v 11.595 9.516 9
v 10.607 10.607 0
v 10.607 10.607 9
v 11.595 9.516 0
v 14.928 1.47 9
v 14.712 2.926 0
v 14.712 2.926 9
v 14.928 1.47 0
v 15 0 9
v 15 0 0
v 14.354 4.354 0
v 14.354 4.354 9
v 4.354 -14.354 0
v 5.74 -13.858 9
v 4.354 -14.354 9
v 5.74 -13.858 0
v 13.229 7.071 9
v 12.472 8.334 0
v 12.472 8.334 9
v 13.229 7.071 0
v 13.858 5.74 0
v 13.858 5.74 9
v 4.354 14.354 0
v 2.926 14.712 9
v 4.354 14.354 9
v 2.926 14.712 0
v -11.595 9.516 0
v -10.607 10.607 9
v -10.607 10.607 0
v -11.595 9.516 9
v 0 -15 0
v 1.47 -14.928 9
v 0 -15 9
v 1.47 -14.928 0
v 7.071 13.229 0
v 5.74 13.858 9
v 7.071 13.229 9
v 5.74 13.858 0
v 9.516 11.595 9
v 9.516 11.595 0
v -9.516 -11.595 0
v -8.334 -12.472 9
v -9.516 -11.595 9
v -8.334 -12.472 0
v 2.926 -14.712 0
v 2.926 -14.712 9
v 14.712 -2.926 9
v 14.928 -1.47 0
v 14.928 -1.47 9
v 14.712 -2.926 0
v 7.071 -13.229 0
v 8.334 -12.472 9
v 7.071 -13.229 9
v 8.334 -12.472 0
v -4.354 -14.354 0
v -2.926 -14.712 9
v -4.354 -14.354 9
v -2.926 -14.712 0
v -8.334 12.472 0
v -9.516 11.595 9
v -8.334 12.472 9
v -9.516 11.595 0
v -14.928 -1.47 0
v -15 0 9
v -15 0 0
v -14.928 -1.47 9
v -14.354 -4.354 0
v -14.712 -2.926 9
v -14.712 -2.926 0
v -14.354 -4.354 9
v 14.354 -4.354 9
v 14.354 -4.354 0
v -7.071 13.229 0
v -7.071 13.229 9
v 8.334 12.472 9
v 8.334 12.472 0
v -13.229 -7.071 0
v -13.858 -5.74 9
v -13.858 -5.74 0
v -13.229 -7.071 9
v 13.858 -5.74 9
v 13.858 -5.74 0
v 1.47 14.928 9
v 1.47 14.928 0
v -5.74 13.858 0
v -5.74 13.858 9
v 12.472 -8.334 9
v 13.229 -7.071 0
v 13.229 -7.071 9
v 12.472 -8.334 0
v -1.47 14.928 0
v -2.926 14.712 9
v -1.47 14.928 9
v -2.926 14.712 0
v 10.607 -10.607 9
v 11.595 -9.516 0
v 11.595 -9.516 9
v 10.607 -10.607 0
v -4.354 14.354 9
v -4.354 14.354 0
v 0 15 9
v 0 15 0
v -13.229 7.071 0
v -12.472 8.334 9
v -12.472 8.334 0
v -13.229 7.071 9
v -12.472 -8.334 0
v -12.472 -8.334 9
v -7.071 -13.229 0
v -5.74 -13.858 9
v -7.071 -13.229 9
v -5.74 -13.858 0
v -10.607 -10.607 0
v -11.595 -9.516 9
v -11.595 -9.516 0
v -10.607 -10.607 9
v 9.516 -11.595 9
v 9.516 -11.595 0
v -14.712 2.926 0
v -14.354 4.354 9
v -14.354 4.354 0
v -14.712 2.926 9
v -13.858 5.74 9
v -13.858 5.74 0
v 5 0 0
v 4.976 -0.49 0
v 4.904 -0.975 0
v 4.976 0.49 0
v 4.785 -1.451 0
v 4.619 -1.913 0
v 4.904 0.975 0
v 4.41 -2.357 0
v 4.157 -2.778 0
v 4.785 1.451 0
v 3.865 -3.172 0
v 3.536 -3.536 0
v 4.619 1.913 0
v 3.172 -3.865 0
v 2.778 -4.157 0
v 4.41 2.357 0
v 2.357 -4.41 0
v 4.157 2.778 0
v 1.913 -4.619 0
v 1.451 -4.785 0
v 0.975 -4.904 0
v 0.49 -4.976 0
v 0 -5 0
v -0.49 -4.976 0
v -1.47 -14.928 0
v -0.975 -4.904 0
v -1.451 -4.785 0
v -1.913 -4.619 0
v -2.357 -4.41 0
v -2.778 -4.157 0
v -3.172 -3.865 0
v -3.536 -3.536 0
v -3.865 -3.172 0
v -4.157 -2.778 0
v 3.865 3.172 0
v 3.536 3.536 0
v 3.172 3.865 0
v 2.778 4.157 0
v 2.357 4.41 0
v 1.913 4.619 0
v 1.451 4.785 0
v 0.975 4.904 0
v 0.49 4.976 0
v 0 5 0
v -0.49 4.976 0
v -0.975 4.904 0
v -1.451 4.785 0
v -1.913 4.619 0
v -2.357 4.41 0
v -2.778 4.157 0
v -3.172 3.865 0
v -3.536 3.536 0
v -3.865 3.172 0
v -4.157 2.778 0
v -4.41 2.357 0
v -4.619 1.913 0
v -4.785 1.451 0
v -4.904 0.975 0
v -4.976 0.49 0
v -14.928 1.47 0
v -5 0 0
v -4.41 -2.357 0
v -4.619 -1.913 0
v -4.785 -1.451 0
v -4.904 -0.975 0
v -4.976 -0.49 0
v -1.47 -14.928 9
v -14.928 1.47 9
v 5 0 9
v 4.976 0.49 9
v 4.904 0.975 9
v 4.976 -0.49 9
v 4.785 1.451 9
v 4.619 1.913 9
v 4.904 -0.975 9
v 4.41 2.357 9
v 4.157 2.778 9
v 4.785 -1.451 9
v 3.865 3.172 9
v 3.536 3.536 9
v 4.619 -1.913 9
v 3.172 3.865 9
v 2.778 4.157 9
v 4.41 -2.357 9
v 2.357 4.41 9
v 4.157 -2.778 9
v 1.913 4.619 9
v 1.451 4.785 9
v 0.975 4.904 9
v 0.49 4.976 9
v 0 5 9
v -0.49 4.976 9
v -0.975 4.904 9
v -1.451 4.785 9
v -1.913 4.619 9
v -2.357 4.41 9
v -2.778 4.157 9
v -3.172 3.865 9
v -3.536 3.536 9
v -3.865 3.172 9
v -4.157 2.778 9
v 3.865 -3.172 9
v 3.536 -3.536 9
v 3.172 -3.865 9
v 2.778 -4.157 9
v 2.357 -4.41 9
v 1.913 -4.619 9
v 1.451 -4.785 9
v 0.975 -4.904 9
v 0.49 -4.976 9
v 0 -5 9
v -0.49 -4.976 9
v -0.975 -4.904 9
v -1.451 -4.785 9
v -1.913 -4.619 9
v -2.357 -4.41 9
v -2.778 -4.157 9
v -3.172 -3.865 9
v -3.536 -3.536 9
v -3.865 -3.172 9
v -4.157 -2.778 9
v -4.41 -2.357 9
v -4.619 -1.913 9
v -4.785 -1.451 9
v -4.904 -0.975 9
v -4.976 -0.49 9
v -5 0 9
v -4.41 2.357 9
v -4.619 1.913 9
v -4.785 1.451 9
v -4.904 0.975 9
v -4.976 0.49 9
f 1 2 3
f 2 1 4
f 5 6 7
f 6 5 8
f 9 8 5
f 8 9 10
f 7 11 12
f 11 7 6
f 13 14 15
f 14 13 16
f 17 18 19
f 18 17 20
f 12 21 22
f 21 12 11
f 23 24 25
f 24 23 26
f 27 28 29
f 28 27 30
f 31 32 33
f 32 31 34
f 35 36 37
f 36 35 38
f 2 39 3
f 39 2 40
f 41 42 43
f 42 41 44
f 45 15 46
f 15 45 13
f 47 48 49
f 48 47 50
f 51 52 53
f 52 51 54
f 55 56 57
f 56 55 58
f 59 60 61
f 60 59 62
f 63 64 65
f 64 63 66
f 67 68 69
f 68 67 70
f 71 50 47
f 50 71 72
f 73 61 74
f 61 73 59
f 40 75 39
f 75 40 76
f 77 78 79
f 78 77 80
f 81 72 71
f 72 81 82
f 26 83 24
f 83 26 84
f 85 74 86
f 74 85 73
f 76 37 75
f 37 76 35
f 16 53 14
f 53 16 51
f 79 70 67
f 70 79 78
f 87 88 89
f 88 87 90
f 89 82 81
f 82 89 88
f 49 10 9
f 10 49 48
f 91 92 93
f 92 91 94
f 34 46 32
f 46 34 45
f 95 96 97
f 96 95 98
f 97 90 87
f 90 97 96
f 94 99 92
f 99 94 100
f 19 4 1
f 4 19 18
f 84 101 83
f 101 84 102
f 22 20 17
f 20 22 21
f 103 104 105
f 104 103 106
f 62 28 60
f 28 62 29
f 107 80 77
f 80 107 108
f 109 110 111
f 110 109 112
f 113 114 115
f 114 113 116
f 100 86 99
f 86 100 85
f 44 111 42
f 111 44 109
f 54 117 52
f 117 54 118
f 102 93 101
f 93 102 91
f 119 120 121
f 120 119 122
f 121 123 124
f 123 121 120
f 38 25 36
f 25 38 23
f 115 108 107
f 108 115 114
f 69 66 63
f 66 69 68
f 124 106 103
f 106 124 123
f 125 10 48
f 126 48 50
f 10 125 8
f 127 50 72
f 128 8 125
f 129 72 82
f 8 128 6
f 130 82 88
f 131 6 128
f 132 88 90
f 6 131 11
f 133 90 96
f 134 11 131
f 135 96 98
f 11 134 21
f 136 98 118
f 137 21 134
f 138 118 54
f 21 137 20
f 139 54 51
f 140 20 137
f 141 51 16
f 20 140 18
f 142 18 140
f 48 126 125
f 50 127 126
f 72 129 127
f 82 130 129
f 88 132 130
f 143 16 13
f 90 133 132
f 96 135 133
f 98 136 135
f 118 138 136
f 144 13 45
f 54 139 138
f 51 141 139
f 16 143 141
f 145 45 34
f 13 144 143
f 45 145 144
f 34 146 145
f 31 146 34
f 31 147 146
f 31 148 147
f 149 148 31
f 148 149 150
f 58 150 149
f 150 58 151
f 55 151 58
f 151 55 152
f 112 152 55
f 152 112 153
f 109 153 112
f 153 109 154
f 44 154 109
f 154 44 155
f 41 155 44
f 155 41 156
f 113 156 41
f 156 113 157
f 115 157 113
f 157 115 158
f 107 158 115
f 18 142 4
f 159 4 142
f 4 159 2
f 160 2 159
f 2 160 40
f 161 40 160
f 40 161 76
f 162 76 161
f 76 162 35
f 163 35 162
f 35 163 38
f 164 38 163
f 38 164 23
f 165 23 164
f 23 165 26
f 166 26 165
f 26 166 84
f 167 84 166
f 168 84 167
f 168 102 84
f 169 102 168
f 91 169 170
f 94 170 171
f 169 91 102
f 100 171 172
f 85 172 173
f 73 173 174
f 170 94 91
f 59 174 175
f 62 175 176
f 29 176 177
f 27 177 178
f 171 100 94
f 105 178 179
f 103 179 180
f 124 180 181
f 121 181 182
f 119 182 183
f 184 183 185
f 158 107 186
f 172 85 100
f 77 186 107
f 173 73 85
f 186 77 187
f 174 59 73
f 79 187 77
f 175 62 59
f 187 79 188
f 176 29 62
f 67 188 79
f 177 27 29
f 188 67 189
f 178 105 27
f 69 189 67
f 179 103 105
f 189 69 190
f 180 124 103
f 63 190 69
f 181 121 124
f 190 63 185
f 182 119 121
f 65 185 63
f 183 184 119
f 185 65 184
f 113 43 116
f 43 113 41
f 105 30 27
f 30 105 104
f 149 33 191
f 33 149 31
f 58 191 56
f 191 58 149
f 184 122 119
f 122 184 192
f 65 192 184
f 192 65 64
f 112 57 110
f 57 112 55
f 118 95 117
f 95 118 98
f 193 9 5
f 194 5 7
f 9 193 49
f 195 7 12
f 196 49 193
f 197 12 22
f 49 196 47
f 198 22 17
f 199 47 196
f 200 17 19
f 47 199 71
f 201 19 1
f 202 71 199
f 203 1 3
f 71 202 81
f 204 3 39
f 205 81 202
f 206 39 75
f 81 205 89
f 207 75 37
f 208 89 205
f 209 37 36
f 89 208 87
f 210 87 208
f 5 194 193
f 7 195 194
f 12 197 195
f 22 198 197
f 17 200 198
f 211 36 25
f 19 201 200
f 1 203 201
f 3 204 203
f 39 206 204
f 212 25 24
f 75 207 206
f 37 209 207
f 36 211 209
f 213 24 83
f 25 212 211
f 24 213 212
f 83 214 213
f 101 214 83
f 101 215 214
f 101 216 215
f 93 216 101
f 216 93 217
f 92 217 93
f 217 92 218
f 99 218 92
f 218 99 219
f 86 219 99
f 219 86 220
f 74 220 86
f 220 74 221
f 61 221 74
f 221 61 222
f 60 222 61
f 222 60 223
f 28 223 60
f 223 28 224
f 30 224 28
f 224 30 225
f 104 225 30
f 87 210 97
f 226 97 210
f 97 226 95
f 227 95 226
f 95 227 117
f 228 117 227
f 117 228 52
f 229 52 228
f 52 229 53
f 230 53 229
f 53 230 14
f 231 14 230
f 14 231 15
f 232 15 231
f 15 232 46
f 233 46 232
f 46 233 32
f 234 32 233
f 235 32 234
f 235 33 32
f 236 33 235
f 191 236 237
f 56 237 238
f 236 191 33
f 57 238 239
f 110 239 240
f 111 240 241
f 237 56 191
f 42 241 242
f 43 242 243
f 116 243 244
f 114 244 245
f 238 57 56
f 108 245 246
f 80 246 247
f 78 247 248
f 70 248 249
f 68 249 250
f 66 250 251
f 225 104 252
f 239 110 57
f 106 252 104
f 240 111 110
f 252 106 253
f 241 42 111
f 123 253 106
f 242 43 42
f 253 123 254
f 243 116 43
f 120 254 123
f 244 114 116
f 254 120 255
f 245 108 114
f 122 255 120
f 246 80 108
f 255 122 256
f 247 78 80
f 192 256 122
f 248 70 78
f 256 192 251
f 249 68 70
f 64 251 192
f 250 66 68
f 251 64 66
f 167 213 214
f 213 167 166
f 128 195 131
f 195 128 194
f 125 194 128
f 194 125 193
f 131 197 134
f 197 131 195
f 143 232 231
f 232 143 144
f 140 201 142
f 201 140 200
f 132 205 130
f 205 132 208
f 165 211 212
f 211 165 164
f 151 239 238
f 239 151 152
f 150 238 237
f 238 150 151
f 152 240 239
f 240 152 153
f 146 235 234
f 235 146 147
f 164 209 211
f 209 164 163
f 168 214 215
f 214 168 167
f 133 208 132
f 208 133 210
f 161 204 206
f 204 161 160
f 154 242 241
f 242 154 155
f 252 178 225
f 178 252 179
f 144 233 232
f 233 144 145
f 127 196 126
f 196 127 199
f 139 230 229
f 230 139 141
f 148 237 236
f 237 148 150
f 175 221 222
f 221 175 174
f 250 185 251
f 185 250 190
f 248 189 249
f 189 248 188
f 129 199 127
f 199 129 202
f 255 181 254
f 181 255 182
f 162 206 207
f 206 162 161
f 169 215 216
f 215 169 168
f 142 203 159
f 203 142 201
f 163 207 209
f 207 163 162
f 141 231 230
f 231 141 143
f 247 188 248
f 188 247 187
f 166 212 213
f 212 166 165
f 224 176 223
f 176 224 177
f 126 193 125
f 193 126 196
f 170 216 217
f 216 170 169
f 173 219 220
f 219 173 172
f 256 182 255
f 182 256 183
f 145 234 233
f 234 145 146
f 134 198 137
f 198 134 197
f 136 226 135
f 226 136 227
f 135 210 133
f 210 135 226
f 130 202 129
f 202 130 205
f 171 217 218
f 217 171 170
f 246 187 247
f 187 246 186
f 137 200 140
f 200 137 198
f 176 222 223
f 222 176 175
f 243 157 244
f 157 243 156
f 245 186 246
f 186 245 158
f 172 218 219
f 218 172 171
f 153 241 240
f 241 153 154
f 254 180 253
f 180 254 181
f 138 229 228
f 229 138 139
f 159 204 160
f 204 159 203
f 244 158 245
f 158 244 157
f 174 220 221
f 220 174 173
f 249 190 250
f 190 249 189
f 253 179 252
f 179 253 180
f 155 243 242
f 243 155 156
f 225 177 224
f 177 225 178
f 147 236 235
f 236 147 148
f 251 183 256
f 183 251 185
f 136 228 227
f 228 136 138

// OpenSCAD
module ball_bearing() {
    difference() {
        // Outer cylinder
        cylinder(d=30.0, h=9.0, $fn=64);
        
        // Inner bore
        translate([0, 0, -1])
            cylinder(d=10.0, h=11.0, $fn=64);
    }
}

ball_bearing();
